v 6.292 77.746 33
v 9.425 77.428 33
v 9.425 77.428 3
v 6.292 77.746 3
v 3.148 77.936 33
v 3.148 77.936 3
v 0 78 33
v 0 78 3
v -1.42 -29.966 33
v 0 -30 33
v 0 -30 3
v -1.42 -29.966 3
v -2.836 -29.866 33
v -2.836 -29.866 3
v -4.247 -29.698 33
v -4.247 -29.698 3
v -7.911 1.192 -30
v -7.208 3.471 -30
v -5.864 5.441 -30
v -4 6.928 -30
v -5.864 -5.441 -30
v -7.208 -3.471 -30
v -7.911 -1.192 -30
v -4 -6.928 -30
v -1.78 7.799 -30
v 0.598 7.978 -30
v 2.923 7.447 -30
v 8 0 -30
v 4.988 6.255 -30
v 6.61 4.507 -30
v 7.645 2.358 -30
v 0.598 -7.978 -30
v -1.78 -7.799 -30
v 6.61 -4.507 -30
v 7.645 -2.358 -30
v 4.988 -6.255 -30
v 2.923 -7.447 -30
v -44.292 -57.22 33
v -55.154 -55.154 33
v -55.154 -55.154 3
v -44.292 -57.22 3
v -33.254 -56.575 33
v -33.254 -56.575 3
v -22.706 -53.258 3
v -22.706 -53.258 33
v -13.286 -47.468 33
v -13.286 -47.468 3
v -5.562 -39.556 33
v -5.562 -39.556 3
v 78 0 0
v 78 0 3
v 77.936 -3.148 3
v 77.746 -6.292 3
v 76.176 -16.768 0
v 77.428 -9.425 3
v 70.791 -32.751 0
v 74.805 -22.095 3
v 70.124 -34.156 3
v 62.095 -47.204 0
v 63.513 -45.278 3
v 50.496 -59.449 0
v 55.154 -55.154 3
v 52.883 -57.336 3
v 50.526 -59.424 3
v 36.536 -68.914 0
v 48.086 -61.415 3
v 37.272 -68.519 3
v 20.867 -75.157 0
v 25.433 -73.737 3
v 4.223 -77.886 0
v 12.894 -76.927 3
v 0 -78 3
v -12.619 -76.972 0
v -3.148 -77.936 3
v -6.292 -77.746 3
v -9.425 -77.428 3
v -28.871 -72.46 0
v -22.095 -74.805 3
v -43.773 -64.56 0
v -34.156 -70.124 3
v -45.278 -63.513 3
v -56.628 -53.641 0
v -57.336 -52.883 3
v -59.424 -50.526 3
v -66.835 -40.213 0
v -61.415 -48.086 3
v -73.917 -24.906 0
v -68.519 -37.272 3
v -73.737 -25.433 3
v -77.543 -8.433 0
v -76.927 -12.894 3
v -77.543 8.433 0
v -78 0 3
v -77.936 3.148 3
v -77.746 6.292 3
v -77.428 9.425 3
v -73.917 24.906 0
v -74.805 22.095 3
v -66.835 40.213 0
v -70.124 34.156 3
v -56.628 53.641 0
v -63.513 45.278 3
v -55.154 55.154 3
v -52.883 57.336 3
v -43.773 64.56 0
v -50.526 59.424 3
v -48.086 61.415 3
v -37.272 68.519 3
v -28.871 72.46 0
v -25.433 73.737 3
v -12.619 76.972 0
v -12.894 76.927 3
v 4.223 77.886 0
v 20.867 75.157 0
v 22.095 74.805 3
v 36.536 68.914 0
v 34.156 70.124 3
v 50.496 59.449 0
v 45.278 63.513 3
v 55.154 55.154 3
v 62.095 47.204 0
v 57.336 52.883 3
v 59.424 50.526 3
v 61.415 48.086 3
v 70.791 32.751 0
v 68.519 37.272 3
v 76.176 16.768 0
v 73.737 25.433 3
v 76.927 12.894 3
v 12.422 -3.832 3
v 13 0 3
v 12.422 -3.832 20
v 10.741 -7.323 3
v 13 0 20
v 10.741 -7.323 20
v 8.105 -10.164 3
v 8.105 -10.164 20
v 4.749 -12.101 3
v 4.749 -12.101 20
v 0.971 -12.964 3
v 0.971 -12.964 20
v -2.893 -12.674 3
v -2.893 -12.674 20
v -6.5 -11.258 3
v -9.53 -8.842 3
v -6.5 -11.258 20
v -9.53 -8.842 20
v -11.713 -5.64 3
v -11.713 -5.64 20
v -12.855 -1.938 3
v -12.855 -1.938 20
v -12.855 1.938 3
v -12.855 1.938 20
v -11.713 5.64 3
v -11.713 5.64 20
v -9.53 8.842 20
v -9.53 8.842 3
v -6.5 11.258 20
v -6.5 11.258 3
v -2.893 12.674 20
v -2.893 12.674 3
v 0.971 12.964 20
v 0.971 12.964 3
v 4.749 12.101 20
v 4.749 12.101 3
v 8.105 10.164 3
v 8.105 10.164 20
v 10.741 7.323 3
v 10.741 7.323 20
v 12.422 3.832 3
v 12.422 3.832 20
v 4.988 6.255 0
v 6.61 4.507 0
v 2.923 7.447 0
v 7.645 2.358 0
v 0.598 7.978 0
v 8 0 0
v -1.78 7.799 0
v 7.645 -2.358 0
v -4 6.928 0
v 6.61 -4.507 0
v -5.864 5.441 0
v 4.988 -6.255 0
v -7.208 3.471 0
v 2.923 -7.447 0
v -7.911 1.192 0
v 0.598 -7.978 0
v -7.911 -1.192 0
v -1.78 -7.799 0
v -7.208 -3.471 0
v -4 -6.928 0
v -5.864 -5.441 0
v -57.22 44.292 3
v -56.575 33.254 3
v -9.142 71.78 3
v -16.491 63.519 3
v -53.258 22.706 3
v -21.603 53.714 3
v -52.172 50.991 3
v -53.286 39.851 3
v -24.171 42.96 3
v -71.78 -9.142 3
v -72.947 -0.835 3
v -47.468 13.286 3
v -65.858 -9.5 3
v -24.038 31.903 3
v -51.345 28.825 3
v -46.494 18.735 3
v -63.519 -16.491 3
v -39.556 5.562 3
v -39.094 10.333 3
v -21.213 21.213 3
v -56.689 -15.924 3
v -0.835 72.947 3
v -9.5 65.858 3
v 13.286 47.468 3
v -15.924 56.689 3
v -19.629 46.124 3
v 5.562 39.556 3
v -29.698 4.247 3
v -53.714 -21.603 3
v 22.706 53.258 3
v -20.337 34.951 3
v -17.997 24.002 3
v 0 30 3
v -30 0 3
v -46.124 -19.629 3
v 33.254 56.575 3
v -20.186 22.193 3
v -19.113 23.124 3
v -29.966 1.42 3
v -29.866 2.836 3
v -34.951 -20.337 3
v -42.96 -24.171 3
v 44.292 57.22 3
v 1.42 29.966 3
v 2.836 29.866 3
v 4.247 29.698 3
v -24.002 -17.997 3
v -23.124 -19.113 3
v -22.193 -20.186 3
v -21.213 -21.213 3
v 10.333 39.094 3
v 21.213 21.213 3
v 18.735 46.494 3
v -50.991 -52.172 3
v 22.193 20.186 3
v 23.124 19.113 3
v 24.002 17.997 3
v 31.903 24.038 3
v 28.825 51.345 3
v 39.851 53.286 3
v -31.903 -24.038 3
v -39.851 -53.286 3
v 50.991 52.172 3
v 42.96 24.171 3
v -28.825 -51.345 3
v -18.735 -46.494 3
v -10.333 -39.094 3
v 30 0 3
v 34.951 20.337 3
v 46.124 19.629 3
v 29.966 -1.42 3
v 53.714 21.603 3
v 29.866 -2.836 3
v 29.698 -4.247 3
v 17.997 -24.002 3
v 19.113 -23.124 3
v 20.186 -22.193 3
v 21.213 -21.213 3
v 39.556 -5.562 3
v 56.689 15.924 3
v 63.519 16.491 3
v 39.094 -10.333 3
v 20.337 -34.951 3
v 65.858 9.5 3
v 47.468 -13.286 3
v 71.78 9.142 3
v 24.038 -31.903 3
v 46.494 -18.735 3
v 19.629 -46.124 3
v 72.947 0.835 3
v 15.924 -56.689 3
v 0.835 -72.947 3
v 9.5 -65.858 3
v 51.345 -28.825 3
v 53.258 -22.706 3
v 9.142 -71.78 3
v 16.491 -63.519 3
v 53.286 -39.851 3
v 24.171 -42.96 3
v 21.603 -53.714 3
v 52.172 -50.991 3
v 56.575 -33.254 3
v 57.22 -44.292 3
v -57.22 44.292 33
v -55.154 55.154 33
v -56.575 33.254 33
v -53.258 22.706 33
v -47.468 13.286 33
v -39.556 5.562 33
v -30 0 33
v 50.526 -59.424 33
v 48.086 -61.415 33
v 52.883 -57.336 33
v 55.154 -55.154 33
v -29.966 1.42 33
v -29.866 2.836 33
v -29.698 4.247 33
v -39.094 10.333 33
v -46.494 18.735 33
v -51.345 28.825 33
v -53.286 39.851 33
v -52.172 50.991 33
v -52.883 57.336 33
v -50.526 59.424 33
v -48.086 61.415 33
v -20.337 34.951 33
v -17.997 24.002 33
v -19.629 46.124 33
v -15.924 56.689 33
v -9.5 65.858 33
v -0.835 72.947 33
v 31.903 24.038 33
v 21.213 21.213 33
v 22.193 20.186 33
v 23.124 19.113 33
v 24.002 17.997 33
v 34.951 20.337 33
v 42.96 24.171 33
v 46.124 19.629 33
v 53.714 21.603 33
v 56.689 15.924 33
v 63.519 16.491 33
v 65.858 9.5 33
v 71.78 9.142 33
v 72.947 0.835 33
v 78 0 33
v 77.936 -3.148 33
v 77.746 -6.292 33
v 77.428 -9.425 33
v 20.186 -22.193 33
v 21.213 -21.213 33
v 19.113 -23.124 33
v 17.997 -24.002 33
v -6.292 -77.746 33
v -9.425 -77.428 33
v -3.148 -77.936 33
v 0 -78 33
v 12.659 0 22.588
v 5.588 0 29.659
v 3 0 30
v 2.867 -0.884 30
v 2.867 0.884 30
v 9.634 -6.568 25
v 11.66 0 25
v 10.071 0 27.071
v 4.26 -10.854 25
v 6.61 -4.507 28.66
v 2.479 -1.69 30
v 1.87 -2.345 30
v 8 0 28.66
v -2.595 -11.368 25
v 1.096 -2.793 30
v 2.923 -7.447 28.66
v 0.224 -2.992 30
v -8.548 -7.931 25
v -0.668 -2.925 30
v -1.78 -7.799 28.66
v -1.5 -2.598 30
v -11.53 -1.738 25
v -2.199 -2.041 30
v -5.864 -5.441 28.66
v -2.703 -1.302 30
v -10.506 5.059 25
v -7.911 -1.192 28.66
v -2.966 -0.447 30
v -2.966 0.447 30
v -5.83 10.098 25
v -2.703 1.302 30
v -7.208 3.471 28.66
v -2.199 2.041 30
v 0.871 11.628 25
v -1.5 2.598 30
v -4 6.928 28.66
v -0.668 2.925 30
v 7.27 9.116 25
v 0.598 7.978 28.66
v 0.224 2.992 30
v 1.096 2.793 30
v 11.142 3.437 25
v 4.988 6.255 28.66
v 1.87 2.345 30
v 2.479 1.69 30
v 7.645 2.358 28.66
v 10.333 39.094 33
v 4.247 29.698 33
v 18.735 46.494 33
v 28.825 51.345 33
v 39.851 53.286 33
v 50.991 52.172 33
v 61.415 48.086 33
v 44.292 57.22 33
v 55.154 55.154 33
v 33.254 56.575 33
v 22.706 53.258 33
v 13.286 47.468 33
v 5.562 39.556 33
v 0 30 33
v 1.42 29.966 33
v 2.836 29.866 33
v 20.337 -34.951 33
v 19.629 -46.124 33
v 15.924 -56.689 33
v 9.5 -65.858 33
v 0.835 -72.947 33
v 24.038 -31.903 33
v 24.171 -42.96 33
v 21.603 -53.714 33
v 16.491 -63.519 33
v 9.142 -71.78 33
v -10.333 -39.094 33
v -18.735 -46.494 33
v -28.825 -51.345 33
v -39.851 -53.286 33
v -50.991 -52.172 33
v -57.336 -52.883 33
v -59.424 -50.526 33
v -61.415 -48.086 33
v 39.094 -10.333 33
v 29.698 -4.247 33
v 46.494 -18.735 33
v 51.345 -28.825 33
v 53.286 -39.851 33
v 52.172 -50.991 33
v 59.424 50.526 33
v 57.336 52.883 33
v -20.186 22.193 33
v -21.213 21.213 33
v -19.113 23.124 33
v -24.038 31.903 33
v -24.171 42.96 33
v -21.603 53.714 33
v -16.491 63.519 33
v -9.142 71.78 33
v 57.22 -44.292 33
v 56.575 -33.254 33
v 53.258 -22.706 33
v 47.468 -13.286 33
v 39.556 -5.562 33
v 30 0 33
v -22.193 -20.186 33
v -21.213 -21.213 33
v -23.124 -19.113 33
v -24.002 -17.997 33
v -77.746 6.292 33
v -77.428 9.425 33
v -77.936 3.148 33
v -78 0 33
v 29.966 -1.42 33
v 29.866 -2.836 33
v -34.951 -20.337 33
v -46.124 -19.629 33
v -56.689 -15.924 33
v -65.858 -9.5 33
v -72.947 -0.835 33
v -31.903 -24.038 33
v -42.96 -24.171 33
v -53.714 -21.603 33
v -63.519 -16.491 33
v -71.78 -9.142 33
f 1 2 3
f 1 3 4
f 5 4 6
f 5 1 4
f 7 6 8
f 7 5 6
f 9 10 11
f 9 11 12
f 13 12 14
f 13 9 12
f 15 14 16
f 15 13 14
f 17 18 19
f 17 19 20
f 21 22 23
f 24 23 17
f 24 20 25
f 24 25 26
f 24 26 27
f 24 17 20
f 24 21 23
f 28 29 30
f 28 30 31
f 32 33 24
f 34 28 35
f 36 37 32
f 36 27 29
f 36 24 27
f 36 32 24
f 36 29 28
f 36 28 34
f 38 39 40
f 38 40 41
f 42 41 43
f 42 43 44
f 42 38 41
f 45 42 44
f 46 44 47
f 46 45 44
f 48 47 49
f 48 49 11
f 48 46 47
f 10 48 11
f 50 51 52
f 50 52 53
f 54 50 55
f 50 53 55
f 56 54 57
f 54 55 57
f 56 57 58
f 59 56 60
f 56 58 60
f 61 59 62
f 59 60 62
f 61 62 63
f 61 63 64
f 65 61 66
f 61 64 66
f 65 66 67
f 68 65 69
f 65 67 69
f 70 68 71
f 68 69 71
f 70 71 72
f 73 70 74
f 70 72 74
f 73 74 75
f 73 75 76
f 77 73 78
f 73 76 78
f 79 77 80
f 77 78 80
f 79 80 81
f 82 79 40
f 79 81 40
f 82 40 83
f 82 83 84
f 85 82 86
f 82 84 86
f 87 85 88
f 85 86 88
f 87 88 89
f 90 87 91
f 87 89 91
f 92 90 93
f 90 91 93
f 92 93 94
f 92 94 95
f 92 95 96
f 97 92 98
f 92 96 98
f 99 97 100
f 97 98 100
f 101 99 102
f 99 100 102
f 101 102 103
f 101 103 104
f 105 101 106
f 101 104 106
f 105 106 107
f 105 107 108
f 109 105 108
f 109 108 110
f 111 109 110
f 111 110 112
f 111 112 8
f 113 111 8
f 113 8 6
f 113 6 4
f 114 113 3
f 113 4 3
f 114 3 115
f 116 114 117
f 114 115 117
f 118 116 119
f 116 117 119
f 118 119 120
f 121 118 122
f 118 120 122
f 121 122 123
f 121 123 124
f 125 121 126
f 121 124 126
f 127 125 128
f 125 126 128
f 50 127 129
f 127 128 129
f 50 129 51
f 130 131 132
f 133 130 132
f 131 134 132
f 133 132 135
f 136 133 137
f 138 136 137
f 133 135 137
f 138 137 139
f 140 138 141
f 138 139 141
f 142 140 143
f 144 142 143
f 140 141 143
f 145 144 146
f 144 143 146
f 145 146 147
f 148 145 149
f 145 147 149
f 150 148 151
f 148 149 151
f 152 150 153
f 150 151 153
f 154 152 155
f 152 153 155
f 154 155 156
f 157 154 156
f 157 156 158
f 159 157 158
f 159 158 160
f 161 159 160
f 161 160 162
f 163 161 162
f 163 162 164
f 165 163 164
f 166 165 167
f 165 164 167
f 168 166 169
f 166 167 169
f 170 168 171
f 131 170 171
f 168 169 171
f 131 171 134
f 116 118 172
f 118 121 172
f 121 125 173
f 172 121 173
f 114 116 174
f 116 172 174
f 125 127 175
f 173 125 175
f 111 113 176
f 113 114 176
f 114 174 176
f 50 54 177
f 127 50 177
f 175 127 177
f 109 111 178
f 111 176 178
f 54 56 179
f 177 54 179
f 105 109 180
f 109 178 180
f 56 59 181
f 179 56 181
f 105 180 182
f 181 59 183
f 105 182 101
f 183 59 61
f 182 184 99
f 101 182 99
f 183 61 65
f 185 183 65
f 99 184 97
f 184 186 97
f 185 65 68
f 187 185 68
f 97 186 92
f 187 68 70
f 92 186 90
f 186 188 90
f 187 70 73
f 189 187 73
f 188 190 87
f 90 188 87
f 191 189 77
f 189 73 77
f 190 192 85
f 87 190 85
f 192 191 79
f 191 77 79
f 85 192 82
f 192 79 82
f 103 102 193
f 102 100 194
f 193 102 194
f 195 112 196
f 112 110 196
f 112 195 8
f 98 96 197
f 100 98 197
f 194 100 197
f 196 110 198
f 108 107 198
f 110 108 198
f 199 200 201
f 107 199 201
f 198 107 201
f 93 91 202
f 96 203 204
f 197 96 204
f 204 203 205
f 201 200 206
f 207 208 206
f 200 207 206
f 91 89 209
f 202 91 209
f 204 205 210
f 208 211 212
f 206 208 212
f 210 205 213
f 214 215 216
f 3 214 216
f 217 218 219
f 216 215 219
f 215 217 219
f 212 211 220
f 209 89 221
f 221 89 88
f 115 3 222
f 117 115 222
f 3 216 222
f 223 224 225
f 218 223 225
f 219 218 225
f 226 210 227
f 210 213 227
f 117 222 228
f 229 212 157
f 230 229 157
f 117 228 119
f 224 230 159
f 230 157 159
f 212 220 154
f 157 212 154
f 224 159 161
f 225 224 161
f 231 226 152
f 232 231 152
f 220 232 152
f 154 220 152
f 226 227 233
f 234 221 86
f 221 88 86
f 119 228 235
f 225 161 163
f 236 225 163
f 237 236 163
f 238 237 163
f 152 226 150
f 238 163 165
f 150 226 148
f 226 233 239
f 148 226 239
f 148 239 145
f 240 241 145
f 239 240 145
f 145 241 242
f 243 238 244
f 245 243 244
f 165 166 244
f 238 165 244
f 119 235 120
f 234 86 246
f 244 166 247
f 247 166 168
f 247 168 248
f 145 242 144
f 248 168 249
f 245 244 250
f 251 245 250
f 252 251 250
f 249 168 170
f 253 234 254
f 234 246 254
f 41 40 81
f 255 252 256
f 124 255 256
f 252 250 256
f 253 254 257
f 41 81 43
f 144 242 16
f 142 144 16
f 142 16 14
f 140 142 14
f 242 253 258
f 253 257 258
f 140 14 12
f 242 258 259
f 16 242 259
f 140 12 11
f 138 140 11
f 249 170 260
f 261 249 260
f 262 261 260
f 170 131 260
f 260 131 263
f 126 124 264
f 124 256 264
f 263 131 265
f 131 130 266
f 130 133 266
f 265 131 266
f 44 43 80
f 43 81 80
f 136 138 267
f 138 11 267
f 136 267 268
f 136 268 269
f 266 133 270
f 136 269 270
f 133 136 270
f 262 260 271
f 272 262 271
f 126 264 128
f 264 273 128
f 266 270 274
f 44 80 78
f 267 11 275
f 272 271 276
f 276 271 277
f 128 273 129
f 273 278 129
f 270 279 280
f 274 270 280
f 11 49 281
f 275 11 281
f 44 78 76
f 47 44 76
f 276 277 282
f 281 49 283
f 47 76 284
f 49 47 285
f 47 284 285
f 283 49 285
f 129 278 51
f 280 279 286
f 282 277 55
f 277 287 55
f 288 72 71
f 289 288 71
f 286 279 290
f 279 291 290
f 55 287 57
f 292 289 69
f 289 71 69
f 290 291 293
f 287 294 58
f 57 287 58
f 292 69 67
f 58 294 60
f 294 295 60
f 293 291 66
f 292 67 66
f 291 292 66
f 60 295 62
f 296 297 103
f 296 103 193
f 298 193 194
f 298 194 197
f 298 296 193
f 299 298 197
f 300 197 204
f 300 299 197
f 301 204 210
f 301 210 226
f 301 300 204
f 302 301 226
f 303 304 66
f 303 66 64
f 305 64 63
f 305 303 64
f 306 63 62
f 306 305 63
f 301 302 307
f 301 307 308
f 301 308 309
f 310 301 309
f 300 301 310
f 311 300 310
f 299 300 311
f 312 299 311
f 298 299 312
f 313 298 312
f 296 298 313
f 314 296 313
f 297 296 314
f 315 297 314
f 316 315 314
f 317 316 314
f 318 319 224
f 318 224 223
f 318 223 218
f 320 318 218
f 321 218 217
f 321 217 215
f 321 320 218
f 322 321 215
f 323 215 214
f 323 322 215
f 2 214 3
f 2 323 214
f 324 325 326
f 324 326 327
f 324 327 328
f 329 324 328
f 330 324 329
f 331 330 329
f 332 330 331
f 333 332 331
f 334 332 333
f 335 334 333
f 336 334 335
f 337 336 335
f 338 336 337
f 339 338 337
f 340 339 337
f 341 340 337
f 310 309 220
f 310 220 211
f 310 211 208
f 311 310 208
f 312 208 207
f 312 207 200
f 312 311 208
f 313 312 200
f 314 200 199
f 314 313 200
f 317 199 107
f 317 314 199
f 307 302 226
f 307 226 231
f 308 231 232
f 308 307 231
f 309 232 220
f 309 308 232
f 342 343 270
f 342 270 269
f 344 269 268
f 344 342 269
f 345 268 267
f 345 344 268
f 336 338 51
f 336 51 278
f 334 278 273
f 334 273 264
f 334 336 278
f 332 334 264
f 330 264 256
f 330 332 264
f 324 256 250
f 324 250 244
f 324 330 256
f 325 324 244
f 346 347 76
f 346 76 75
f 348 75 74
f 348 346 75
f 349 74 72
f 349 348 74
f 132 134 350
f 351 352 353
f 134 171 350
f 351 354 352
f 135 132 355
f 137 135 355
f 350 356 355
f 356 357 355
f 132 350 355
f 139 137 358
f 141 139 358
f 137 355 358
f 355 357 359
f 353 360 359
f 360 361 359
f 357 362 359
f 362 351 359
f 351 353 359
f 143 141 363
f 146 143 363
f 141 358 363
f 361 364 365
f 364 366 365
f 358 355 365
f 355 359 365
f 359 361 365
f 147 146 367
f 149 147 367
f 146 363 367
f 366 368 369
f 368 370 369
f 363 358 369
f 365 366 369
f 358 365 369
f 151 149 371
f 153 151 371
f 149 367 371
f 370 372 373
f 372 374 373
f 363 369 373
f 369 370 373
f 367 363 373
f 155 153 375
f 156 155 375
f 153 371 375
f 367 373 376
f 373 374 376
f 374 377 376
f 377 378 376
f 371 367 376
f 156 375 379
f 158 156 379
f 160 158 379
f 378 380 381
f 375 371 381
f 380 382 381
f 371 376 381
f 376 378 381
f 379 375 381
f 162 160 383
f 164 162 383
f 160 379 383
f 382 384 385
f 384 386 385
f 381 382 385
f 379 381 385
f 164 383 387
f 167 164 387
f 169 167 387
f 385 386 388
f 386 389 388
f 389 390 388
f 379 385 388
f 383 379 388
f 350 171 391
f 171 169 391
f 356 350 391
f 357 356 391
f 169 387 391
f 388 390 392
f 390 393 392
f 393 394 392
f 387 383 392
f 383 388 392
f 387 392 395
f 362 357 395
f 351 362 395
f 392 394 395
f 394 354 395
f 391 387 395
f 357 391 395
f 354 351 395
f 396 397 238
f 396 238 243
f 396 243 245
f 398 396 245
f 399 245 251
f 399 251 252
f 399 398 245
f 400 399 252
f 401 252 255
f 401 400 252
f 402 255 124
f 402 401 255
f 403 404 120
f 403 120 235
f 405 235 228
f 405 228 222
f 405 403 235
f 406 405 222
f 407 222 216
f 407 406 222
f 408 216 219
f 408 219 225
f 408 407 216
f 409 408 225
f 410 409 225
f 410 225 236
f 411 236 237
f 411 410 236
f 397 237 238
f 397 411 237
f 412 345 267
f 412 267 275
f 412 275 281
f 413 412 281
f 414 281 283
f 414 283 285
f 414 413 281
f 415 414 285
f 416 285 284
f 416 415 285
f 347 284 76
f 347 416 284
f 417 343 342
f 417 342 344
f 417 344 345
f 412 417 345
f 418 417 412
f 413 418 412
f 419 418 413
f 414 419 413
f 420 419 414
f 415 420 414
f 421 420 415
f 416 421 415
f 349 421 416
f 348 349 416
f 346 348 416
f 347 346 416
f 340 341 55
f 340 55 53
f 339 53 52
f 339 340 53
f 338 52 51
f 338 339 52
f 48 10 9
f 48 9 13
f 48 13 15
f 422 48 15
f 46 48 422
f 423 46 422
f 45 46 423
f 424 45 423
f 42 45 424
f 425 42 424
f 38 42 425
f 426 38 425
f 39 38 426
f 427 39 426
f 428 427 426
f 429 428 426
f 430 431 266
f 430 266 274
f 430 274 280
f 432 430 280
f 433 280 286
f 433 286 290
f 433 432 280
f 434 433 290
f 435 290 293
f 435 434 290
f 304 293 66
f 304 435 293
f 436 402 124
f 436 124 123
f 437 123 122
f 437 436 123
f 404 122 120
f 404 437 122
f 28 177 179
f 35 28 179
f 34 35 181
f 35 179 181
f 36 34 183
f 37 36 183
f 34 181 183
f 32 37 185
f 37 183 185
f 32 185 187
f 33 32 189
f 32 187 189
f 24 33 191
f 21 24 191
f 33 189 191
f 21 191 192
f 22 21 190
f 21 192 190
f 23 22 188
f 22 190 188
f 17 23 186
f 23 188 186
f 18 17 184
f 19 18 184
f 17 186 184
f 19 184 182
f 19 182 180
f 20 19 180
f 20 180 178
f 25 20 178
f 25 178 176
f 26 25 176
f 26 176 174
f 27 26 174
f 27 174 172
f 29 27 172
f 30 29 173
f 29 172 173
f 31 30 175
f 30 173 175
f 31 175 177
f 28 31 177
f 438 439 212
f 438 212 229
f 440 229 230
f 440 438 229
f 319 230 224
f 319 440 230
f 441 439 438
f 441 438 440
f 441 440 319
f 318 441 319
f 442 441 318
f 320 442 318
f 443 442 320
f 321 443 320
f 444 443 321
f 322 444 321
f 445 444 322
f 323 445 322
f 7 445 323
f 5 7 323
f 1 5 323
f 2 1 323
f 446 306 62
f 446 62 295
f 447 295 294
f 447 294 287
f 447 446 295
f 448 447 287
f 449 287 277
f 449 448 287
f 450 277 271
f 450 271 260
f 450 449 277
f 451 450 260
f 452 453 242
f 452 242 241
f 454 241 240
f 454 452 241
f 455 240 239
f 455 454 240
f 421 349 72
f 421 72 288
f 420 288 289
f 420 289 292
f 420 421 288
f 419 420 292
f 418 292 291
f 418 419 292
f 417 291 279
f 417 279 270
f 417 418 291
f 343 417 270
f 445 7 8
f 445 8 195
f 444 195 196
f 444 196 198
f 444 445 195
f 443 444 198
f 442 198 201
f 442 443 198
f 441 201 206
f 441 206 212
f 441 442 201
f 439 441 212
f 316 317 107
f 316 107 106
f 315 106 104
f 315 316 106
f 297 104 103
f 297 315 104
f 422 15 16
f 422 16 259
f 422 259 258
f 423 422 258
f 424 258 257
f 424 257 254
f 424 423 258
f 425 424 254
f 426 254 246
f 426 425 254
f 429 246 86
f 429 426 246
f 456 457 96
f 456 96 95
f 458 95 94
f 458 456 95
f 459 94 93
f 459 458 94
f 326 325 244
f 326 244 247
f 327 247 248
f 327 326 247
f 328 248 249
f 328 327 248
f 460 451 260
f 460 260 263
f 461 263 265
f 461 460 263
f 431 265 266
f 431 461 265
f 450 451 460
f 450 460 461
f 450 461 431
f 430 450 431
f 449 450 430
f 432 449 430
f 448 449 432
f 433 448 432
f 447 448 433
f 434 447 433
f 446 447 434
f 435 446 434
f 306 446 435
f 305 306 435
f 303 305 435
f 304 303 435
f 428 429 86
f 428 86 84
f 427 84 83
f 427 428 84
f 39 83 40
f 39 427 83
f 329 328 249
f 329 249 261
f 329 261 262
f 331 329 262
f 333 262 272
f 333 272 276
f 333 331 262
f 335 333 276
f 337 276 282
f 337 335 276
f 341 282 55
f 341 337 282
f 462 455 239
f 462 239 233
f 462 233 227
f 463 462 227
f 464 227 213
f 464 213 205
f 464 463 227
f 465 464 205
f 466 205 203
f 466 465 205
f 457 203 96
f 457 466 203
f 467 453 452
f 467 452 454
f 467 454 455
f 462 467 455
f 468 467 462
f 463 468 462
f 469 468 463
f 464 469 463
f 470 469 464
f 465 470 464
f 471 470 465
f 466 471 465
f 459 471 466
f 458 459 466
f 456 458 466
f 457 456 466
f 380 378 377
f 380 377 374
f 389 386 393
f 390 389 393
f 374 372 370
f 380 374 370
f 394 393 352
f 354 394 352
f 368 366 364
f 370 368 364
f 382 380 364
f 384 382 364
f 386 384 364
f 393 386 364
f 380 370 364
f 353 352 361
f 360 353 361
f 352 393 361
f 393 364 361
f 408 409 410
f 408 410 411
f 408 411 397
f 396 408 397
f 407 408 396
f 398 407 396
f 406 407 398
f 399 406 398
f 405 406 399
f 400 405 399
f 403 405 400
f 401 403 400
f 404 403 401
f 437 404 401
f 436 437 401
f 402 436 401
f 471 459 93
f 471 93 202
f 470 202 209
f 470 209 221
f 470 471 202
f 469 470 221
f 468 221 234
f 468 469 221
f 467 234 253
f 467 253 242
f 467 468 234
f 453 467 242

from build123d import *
from build123d.topology import SkipClean

# Parameters (mm, degrees)
BOSS_EXTRUDE1_START = 30
BOSS_EXTRUDE1_DEPTH = 30
CIRPATTERN1_COUNT   = 8
SKETCH3_R           = 8
BOSS_EXTRUDE2_DEPTH = 30


with BuildPart() as part:
    # Sketch1 → Revolve1 (revolve)
    with BuildSketch(Plane(origin=(0, 0, 0), x_dir=(0, 0, -1), z_dir=(1, 0, 0)), mode=Mode.PRIVATE) as revolve1_sk:
        with BuildLine():
            Line((0, 0), (0, 78))
            Line((0, 78), (-3, 78))
            Line((-3, 78), (-3, 13))
            Line((-3, 13), (-20, 13))
            ThreePointArc((-20, 13), (-27.071067812, 10.071067812), (-30, 3))
            Line((-30, 3), (-30, 0))
            Line((-30, 0), (0, 0))
        make_face()
    revolve(revolve1_sk.sketch.rotate(Axis((0, 0, 30), (0, 0, -1)), 90), axis=Axis((0, 0, 30), (0, 0, -1)))

    # Sketch2 → Boss-Extrude1 (add)
    with BuildSketch(Plane.XY.offset(3).offset(BOSS_EXTRUDE1_START)):
        with BuildLine():
            ThreePointArc((-21.213203436, 21.213203436), (-19.654544502, 22.664926217), (-17.996806645, 24.002394684))
            ThreePointArc((-17.996806645, 24.002394684), (-15.924246169, 56.688991773), (9.42496759, 77.42848304))
            ThreePointArc((9.42496759, 77.42848304), (4.721139844, 77.856989658), (0, 78))
            ThreePointArc((0, 78), (-21.603078805, 53.7144317), (-21.213203436, 21.213203436))
        make_face()
    boss_extrude1 = extrude(amount=-BOSS_EXTRUDE1_DEPTH)

    # CirPattern1: Boss-Extrude1 ×8 about axis
    with SkipClean():  # the faces are left unmerged after this step: merging them gives an invalid solid
        cirpattern1_axis = Axis((0, 0, 0), (0, 0, 1))
        for i in range(1, CIRPATTERN1_COUNT):
            add(boss_extrude1.rotate(cirpattern1_axis, i * 360 / CIRPATTERN1_COUNT))

    # Sketch3 → Boss-Extrude2 (add)
    with SkipClean():  # the faces are left unmerged after this step: merging them gives an invalid solid
        with BuildSketch(Plane(origin=(0, 0, 0), x_dir=(-1, 0, 0), z_dir=(0, 0, -1))):
            with Locations(Location((0, 0, 0), (0, 0, 180))):
                Circle(SKETCH3_R)
        extrude(amount=BOSS_EXTRUDE2_DEPTH)


solid = part.part
